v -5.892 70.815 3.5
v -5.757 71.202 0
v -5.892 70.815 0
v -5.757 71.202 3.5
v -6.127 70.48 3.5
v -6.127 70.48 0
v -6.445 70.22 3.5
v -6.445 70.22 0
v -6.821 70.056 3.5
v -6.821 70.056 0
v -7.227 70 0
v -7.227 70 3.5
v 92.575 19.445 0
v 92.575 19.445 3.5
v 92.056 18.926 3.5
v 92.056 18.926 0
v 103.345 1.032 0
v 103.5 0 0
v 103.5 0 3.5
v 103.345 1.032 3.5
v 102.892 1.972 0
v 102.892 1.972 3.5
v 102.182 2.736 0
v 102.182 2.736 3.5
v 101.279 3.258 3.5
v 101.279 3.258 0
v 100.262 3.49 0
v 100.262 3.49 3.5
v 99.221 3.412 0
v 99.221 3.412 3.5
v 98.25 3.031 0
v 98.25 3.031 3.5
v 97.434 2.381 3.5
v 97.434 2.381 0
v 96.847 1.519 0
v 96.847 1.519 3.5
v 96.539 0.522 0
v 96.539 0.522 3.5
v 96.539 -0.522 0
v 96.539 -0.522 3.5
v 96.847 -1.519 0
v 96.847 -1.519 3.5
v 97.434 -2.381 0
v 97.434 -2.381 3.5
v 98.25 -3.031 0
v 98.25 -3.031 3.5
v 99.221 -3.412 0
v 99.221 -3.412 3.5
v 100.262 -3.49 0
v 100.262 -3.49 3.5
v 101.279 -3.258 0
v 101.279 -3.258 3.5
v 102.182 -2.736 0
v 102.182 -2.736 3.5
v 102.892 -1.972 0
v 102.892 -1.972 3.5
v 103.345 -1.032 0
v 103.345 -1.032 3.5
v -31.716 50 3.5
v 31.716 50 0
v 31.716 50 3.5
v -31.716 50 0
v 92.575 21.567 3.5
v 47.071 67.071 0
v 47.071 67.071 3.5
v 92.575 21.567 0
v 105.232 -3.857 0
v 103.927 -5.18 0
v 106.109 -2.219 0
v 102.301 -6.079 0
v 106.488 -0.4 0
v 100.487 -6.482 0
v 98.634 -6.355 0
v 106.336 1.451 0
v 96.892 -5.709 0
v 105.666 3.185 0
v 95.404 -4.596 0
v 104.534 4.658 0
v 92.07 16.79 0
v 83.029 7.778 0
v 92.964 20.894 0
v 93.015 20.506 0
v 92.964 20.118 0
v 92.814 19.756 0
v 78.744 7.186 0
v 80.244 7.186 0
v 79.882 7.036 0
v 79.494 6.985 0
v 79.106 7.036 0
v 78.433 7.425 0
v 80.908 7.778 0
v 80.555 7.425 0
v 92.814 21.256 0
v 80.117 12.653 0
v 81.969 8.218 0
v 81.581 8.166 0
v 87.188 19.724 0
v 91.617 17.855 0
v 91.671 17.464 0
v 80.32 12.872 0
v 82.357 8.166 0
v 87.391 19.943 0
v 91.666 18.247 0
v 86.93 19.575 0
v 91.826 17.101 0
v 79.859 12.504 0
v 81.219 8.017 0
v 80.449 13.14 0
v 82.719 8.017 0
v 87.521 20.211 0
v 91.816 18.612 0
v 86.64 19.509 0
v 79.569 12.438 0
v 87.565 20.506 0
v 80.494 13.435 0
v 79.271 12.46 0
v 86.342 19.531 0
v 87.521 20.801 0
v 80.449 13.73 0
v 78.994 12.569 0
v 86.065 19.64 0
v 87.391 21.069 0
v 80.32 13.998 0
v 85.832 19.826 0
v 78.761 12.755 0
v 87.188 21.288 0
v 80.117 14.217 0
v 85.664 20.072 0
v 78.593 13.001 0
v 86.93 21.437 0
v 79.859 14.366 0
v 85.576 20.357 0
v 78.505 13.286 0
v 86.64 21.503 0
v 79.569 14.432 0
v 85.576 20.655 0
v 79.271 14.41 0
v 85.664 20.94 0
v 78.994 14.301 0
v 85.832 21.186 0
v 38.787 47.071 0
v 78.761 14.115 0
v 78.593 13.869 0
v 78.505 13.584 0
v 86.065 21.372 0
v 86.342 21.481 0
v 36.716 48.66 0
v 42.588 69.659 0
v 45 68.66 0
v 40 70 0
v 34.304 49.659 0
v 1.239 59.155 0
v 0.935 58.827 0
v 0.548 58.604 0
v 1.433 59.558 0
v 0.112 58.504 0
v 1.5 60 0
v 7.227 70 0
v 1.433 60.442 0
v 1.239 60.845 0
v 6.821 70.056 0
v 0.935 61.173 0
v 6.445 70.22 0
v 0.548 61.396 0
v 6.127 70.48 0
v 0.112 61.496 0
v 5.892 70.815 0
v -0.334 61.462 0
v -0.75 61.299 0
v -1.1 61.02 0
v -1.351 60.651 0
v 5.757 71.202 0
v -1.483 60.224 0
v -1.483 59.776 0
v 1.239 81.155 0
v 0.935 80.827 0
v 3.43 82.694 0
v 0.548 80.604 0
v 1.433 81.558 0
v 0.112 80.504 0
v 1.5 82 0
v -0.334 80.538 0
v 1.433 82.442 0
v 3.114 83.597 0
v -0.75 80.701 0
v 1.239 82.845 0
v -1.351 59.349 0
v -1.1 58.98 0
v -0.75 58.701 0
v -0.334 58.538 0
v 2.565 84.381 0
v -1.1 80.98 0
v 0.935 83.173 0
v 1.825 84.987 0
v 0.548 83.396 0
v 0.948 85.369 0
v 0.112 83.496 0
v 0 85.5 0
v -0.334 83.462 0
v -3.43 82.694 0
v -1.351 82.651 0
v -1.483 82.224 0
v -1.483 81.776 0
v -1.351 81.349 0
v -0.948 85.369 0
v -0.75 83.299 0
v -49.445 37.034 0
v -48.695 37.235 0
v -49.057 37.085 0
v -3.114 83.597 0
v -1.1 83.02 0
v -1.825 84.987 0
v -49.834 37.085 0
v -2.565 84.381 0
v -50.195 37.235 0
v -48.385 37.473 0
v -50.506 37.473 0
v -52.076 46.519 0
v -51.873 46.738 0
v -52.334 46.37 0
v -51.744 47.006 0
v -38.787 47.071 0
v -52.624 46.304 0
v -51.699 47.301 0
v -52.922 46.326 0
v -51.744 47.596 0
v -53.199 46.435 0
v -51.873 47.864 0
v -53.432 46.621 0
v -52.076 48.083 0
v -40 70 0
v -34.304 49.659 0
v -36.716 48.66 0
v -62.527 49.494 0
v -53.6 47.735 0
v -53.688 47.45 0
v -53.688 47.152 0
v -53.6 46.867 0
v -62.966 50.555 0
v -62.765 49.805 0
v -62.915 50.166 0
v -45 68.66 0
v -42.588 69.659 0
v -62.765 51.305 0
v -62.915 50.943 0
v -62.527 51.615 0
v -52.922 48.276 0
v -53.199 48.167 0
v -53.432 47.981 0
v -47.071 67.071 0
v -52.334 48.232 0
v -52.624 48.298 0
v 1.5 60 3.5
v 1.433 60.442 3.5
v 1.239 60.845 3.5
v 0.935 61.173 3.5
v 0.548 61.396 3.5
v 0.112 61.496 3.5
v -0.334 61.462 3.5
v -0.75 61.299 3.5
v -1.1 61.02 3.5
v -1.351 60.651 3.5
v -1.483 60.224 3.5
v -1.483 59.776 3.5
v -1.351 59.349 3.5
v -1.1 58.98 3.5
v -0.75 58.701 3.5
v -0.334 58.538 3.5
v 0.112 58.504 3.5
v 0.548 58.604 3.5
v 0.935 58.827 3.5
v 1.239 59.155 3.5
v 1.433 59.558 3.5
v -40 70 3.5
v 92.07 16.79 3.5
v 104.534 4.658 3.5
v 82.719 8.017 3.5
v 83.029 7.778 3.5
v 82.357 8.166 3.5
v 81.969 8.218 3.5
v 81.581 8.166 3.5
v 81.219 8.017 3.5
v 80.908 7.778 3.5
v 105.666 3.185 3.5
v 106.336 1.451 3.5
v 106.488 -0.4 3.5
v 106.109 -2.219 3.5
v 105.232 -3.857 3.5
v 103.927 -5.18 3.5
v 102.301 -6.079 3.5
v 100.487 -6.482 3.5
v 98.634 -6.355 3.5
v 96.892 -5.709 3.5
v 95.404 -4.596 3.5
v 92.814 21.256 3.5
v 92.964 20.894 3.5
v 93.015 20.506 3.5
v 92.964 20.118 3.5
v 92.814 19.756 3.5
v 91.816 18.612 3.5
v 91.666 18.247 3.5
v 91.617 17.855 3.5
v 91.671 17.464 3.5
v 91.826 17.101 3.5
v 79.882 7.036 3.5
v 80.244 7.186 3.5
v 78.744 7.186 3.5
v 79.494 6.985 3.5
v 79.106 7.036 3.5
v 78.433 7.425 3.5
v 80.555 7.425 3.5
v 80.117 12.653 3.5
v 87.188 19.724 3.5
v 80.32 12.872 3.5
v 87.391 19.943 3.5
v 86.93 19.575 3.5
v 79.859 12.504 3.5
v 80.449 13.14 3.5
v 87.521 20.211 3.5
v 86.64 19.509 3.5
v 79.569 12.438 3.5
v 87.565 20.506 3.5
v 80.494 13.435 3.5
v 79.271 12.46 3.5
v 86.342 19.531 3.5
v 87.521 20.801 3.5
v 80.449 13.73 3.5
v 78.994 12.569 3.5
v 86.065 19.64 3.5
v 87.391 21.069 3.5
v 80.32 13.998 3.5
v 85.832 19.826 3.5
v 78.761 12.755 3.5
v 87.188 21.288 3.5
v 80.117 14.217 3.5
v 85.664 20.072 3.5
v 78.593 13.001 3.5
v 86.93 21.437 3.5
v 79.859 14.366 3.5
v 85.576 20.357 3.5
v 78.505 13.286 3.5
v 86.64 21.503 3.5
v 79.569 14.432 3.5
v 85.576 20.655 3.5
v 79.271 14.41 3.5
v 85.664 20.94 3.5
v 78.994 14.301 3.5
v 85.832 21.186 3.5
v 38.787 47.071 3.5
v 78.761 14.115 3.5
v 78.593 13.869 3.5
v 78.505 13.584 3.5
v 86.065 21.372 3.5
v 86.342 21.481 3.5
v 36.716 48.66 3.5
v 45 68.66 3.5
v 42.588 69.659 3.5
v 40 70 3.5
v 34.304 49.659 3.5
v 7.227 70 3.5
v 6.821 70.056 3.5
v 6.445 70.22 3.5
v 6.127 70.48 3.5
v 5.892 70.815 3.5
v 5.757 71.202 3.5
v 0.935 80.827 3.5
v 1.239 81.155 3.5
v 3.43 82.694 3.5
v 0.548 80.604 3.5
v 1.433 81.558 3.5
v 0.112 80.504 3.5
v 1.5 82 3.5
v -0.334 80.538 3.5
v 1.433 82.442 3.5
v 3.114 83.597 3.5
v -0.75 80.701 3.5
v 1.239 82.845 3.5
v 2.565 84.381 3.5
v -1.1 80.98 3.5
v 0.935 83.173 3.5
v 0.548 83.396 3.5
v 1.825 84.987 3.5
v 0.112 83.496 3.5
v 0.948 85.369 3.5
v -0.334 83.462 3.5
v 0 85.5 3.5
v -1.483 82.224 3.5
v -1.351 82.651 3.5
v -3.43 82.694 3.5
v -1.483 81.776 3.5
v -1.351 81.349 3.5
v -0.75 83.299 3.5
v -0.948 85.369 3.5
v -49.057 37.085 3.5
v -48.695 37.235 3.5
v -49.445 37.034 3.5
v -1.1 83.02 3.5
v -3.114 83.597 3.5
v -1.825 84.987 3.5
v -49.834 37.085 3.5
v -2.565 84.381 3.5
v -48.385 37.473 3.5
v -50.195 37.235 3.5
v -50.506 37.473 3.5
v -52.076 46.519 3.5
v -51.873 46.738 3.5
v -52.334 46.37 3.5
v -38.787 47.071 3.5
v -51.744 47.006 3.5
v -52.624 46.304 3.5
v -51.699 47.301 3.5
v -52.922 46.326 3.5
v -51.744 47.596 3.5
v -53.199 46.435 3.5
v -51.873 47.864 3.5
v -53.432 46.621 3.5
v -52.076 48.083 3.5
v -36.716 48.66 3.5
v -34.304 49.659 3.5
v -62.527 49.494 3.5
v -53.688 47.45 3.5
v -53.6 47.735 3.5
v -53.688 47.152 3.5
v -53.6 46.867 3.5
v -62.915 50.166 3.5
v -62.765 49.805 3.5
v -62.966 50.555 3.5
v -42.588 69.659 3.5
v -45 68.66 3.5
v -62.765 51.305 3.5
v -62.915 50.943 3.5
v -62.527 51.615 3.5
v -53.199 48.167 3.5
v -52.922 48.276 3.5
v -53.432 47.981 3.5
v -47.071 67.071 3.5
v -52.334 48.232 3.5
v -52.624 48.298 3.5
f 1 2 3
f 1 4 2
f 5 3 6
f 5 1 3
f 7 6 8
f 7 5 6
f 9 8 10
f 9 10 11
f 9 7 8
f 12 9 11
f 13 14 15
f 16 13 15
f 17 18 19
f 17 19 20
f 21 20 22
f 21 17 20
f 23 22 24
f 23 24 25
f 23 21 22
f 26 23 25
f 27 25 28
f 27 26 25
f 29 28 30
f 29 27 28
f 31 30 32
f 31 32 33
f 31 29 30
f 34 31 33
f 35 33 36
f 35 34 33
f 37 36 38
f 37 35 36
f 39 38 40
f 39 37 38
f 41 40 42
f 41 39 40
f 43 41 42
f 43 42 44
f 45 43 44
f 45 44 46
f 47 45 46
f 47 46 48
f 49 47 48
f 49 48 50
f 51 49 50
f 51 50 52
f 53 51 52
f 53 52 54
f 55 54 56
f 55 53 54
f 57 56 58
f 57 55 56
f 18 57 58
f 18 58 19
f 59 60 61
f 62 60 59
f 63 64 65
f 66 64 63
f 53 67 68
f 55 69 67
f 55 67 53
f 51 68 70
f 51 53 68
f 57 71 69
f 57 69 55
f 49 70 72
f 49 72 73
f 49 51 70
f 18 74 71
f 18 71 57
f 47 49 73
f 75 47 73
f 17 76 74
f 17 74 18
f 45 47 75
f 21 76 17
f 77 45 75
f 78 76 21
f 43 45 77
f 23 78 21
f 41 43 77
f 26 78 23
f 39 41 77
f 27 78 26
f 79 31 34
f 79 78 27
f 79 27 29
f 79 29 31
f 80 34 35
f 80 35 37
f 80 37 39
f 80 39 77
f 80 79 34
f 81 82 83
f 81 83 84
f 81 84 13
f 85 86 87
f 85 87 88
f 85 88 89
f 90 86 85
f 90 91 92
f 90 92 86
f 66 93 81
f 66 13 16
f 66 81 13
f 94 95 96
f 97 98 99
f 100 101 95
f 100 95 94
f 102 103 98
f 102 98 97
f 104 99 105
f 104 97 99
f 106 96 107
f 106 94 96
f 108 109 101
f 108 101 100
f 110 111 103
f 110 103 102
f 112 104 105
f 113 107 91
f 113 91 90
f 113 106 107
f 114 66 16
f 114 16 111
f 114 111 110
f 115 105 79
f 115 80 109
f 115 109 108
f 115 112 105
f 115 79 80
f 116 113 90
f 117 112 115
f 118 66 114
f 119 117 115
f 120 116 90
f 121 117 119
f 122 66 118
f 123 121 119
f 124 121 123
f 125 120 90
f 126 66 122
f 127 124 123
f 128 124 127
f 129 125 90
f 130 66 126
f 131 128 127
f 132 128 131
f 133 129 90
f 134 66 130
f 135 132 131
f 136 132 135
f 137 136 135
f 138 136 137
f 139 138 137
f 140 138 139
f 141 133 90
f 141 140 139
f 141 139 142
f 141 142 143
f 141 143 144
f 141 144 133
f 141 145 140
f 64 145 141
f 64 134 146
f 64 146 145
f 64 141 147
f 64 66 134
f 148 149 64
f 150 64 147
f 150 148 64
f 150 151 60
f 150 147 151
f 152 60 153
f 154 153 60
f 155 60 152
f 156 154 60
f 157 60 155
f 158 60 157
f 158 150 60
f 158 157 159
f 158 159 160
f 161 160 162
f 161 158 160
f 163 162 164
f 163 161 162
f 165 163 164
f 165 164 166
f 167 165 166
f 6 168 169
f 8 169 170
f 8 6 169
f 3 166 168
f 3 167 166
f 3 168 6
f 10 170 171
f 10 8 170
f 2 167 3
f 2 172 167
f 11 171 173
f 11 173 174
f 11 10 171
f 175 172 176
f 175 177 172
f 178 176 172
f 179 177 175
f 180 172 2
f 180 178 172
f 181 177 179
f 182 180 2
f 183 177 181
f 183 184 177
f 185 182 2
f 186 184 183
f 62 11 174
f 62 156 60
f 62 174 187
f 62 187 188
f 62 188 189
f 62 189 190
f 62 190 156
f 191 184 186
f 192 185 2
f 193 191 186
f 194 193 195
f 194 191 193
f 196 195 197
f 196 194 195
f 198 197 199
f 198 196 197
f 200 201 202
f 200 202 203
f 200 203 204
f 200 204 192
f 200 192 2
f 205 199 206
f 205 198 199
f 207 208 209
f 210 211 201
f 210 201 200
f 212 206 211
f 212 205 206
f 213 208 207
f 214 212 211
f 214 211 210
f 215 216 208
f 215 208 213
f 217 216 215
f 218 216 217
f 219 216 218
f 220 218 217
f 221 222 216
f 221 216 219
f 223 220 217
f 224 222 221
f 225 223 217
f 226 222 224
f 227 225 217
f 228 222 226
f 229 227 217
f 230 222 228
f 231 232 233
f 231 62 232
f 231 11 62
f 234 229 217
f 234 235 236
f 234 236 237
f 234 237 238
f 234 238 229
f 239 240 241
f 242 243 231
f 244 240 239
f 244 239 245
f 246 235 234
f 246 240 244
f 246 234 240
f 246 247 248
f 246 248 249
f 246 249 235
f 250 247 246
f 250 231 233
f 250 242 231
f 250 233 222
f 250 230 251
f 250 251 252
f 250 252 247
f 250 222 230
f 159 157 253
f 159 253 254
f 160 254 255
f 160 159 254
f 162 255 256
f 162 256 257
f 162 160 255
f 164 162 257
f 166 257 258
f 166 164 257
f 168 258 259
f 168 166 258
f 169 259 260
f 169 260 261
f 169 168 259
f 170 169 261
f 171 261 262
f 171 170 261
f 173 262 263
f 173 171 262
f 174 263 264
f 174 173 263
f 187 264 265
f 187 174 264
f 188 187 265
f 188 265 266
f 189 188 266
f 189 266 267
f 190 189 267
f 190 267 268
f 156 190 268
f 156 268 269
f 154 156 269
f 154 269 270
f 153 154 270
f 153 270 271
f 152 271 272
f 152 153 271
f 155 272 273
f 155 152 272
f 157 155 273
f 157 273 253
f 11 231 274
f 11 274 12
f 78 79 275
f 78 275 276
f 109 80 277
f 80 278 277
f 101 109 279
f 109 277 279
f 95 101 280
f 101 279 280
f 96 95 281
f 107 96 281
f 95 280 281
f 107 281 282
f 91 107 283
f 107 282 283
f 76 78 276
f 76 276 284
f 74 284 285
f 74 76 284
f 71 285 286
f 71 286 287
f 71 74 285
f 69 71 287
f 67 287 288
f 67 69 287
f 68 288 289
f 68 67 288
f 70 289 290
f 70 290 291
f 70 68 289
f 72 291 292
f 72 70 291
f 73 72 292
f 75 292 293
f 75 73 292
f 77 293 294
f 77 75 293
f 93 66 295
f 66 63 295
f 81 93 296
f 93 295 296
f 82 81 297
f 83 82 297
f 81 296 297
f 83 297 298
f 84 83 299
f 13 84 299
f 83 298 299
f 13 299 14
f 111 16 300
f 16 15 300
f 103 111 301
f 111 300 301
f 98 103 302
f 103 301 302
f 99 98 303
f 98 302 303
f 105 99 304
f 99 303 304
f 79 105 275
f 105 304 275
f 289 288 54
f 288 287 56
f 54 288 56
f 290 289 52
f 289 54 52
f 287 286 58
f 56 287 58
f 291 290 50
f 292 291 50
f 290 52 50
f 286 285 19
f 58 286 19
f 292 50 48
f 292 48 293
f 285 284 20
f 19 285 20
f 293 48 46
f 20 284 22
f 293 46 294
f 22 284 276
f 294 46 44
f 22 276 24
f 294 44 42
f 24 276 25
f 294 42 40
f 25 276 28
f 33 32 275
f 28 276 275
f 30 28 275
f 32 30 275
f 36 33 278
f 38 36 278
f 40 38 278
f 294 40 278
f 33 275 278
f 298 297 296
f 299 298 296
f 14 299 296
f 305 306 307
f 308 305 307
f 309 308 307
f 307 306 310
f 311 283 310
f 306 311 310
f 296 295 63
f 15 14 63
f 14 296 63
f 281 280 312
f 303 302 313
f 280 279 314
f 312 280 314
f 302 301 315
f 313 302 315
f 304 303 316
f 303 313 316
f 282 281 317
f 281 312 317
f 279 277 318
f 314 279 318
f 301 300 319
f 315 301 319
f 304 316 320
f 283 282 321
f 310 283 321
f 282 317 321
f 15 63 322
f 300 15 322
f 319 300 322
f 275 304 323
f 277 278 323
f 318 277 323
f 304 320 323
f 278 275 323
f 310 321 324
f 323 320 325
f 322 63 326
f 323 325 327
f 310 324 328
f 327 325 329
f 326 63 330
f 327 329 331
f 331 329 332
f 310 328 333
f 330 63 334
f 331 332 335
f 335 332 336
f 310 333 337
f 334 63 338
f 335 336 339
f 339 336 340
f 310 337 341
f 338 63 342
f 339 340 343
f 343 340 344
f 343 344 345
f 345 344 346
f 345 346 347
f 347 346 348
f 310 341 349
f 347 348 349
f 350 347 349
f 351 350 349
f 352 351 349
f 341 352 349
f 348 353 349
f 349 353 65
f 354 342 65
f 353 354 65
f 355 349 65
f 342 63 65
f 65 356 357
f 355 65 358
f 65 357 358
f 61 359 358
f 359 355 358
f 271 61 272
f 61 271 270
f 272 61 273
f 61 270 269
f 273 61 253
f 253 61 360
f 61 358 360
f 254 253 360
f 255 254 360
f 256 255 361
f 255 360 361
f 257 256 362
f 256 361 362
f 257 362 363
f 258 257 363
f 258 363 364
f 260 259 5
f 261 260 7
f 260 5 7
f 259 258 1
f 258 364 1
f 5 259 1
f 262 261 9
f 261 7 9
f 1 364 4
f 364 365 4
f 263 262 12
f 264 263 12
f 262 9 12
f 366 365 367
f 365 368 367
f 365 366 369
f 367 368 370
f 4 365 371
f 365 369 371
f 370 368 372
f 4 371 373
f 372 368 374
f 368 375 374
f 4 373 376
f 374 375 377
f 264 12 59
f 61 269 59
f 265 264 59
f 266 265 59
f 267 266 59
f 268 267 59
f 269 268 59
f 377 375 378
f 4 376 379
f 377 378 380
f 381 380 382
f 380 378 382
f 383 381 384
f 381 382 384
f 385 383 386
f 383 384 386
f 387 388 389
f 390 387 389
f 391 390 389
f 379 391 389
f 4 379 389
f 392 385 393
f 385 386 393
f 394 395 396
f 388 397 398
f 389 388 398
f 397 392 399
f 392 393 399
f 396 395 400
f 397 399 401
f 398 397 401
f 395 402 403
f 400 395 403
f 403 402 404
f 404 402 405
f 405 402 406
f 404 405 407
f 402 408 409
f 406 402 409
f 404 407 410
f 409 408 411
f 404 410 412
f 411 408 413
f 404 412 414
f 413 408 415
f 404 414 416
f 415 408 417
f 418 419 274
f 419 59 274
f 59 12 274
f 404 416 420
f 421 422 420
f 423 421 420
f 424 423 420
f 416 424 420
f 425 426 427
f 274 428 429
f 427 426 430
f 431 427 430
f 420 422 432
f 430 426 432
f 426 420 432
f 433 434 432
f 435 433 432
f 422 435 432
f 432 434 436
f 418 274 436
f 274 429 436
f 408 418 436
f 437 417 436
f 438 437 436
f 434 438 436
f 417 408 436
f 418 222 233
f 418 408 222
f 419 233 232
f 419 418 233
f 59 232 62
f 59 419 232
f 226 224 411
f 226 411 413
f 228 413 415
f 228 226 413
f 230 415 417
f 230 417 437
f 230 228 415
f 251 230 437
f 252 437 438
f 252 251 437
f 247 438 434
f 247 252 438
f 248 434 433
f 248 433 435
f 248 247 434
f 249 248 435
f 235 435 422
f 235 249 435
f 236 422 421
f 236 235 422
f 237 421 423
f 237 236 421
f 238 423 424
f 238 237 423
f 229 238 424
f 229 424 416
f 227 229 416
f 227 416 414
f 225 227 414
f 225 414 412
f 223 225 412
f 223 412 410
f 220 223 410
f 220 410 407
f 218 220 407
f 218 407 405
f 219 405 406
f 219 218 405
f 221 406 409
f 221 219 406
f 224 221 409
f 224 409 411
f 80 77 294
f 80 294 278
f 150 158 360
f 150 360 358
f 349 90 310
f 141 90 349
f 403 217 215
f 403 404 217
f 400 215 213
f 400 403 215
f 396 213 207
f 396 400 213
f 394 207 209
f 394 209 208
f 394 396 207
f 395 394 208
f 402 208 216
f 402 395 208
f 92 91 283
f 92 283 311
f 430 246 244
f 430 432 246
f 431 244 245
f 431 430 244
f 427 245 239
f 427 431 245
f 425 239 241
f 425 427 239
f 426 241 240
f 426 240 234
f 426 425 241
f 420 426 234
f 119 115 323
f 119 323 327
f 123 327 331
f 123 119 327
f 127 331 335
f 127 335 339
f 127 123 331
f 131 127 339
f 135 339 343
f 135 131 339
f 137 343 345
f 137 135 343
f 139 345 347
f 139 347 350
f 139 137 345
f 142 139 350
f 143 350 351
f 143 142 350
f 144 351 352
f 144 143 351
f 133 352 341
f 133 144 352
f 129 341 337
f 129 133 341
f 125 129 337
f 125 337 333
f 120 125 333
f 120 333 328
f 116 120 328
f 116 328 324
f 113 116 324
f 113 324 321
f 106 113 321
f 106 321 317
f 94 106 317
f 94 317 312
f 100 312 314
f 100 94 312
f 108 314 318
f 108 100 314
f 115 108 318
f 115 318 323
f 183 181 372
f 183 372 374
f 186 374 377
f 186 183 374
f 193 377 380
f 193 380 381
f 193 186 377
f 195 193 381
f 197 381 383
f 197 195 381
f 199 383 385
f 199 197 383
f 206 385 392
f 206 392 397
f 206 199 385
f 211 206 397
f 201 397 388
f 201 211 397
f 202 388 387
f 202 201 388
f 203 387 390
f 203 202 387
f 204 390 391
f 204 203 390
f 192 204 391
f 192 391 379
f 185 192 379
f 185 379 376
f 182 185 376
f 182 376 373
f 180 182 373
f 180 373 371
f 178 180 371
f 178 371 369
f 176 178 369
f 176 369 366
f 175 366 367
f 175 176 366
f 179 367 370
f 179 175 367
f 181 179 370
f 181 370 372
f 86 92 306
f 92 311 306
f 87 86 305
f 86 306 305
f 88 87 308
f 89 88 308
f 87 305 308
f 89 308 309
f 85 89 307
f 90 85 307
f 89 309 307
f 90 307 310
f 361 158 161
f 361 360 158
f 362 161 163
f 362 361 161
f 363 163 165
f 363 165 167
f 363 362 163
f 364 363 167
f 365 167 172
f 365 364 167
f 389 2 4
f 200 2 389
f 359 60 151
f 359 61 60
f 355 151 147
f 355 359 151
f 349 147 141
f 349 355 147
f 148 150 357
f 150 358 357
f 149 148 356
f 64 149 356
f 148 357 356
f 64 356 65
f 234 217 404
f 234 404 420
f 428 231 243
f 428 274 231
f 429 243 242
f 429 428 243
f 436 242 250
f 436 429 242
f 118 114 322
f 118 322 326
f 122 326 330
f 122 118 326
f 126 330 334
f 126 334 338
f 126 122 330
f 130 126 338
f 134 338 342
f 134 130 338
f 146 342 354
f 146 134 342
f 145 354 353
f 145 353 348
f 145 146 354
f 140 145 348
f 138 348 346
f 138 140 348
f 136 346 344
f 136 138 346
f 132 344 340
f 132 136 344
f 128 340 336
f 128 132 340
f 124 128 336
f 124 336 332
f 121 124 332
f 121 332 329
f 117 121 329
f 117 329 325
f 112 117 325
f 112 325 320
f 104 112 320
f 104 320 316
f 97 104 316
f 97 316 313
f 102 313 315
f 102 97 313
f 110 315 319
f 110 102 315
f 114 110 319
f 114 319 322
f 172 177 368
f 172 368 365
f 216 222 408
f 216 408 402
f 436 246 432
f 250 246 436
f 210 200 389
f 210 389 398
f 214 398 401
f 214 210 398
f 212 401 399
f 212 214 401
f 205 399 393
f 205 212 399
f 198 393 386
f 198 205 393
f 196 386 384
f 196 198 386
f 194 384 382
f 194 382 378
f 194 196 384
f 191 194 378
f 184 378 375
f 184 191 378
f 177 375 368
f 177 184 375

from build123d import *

# Parameters (mm, degrees)
SKETCH7_R           = 3.5
SKETCH7_R_2         = 1.5
SKETCH7_R_3         = 1
BOSS_EXTRUDE2_DEPTH = 3.5
FILLET1_R           = 10
FILLET2_R           = 1.5


with BuildPart() as part:
    # Sketch7 → Boss-Extrude2 (new body)
    with BuildSketch(Plane.XY):
        with BuildLine():
            Line((3.430427898, 82.694380615), (6, 70))
            Line((6, 70), (44.142135624, 70))
            Line((44.142135624, 70), (93.636038969, 20.506096654))
            Line((93.636038969, 20.506096654), (90.980851591, 17.850909276))
            Line((90.980851591, 17.850909276), (104.533955357, 4.657601188))
            ThreePointArc((104.533955357, 4.657601188), (104.627002282, -4.565177968), (95.403805922, -4.596194078))
            Line((95.403805922, -4.596194078), (81.96877708, 8.838834765))
            Line((81.96877708, 8.838834765), (79.493903346, 6.363961031))
            Line((79.493903346, 6.363961031), (35.857864376, 50))
            Line((35.857864376, 50), (-35.857864376, 50))
            Line((-35.857864376, 50), (-49.445436483, 36.412427894))
            Line((-49.445436483, 36.412427894), (-63.587572106, 50.554563517))
            Line((-63.587572106, 50.554563517), (-44.142135624, 70))
            Line((-44.142135624, 70), (-6, 70))
            Line((-6, 70), (-3.430427898, 82.694380615))
            ThreePointArc((-3.430427898, 82.694380615), (0, 85.5), (3.430427898, 82.694380615))
        make_face()
        with Locations((100, 0)):
            Circle(SKETCH7_R, mode=Mode.SUBTRACT)
        with Locations((0, 82)):
            Circle(SKETCH7_R_2, mode=Mode.SUBTRACT)
        with Locations((0, 60)):
            Circle(SKETCH7_R_2, mode=Mode.SUBTRACT)
        with Locations((86.564971157, 20.506096654)):
            Circle(SKETCH7_R_3, mode=Mode.SUBTRACT)
        with Locations((79.493903346, 13.435028843)):
            Circle(SKETCH7_R_3, mode=Mode.SUBTRACT)
        with Locations((-52.699132326, 47.300867674)):
            Circle(SKETCH7_R_3, mode=Mode.SUBTRACT)
    extrude(amount=BOSS_EXTRUDE2_DEPTH)

    # Fillet1
    fillet1_edges = [part.edges().sort_by_distance(p)[0] for p in [
        (44.142135624, 70, 1.75),
        (35.857864376, 50, 1.75),
        (-35.857864376, 50, 1.75),
        (-44.142135624, 70, 1.75),
    ]]
    fillet(fillet1_edges, radius=FILLET1_R)

    # Fillet2
    fillet2_edges = [part.edges().sort_by_distance(p)[0] for p in [
        (6, 70, 1.75),
        (93.636038969, 20.506096654, 1.75),
        (90.980851591, 17.850909276, 1.75),
        (81.96877708, 8.838834765, 1.75),
        (79.493903346, 6.363961031, 1.75),
        (-49.445436483, 36.412427894, 1.75),
        (-63.587572106, 50.554563517, 1.75),
        (-6, 70, 1.75),
    ]]
    fillet(fillet2_edges, radius=FILLET2_R)


solid = part.part
